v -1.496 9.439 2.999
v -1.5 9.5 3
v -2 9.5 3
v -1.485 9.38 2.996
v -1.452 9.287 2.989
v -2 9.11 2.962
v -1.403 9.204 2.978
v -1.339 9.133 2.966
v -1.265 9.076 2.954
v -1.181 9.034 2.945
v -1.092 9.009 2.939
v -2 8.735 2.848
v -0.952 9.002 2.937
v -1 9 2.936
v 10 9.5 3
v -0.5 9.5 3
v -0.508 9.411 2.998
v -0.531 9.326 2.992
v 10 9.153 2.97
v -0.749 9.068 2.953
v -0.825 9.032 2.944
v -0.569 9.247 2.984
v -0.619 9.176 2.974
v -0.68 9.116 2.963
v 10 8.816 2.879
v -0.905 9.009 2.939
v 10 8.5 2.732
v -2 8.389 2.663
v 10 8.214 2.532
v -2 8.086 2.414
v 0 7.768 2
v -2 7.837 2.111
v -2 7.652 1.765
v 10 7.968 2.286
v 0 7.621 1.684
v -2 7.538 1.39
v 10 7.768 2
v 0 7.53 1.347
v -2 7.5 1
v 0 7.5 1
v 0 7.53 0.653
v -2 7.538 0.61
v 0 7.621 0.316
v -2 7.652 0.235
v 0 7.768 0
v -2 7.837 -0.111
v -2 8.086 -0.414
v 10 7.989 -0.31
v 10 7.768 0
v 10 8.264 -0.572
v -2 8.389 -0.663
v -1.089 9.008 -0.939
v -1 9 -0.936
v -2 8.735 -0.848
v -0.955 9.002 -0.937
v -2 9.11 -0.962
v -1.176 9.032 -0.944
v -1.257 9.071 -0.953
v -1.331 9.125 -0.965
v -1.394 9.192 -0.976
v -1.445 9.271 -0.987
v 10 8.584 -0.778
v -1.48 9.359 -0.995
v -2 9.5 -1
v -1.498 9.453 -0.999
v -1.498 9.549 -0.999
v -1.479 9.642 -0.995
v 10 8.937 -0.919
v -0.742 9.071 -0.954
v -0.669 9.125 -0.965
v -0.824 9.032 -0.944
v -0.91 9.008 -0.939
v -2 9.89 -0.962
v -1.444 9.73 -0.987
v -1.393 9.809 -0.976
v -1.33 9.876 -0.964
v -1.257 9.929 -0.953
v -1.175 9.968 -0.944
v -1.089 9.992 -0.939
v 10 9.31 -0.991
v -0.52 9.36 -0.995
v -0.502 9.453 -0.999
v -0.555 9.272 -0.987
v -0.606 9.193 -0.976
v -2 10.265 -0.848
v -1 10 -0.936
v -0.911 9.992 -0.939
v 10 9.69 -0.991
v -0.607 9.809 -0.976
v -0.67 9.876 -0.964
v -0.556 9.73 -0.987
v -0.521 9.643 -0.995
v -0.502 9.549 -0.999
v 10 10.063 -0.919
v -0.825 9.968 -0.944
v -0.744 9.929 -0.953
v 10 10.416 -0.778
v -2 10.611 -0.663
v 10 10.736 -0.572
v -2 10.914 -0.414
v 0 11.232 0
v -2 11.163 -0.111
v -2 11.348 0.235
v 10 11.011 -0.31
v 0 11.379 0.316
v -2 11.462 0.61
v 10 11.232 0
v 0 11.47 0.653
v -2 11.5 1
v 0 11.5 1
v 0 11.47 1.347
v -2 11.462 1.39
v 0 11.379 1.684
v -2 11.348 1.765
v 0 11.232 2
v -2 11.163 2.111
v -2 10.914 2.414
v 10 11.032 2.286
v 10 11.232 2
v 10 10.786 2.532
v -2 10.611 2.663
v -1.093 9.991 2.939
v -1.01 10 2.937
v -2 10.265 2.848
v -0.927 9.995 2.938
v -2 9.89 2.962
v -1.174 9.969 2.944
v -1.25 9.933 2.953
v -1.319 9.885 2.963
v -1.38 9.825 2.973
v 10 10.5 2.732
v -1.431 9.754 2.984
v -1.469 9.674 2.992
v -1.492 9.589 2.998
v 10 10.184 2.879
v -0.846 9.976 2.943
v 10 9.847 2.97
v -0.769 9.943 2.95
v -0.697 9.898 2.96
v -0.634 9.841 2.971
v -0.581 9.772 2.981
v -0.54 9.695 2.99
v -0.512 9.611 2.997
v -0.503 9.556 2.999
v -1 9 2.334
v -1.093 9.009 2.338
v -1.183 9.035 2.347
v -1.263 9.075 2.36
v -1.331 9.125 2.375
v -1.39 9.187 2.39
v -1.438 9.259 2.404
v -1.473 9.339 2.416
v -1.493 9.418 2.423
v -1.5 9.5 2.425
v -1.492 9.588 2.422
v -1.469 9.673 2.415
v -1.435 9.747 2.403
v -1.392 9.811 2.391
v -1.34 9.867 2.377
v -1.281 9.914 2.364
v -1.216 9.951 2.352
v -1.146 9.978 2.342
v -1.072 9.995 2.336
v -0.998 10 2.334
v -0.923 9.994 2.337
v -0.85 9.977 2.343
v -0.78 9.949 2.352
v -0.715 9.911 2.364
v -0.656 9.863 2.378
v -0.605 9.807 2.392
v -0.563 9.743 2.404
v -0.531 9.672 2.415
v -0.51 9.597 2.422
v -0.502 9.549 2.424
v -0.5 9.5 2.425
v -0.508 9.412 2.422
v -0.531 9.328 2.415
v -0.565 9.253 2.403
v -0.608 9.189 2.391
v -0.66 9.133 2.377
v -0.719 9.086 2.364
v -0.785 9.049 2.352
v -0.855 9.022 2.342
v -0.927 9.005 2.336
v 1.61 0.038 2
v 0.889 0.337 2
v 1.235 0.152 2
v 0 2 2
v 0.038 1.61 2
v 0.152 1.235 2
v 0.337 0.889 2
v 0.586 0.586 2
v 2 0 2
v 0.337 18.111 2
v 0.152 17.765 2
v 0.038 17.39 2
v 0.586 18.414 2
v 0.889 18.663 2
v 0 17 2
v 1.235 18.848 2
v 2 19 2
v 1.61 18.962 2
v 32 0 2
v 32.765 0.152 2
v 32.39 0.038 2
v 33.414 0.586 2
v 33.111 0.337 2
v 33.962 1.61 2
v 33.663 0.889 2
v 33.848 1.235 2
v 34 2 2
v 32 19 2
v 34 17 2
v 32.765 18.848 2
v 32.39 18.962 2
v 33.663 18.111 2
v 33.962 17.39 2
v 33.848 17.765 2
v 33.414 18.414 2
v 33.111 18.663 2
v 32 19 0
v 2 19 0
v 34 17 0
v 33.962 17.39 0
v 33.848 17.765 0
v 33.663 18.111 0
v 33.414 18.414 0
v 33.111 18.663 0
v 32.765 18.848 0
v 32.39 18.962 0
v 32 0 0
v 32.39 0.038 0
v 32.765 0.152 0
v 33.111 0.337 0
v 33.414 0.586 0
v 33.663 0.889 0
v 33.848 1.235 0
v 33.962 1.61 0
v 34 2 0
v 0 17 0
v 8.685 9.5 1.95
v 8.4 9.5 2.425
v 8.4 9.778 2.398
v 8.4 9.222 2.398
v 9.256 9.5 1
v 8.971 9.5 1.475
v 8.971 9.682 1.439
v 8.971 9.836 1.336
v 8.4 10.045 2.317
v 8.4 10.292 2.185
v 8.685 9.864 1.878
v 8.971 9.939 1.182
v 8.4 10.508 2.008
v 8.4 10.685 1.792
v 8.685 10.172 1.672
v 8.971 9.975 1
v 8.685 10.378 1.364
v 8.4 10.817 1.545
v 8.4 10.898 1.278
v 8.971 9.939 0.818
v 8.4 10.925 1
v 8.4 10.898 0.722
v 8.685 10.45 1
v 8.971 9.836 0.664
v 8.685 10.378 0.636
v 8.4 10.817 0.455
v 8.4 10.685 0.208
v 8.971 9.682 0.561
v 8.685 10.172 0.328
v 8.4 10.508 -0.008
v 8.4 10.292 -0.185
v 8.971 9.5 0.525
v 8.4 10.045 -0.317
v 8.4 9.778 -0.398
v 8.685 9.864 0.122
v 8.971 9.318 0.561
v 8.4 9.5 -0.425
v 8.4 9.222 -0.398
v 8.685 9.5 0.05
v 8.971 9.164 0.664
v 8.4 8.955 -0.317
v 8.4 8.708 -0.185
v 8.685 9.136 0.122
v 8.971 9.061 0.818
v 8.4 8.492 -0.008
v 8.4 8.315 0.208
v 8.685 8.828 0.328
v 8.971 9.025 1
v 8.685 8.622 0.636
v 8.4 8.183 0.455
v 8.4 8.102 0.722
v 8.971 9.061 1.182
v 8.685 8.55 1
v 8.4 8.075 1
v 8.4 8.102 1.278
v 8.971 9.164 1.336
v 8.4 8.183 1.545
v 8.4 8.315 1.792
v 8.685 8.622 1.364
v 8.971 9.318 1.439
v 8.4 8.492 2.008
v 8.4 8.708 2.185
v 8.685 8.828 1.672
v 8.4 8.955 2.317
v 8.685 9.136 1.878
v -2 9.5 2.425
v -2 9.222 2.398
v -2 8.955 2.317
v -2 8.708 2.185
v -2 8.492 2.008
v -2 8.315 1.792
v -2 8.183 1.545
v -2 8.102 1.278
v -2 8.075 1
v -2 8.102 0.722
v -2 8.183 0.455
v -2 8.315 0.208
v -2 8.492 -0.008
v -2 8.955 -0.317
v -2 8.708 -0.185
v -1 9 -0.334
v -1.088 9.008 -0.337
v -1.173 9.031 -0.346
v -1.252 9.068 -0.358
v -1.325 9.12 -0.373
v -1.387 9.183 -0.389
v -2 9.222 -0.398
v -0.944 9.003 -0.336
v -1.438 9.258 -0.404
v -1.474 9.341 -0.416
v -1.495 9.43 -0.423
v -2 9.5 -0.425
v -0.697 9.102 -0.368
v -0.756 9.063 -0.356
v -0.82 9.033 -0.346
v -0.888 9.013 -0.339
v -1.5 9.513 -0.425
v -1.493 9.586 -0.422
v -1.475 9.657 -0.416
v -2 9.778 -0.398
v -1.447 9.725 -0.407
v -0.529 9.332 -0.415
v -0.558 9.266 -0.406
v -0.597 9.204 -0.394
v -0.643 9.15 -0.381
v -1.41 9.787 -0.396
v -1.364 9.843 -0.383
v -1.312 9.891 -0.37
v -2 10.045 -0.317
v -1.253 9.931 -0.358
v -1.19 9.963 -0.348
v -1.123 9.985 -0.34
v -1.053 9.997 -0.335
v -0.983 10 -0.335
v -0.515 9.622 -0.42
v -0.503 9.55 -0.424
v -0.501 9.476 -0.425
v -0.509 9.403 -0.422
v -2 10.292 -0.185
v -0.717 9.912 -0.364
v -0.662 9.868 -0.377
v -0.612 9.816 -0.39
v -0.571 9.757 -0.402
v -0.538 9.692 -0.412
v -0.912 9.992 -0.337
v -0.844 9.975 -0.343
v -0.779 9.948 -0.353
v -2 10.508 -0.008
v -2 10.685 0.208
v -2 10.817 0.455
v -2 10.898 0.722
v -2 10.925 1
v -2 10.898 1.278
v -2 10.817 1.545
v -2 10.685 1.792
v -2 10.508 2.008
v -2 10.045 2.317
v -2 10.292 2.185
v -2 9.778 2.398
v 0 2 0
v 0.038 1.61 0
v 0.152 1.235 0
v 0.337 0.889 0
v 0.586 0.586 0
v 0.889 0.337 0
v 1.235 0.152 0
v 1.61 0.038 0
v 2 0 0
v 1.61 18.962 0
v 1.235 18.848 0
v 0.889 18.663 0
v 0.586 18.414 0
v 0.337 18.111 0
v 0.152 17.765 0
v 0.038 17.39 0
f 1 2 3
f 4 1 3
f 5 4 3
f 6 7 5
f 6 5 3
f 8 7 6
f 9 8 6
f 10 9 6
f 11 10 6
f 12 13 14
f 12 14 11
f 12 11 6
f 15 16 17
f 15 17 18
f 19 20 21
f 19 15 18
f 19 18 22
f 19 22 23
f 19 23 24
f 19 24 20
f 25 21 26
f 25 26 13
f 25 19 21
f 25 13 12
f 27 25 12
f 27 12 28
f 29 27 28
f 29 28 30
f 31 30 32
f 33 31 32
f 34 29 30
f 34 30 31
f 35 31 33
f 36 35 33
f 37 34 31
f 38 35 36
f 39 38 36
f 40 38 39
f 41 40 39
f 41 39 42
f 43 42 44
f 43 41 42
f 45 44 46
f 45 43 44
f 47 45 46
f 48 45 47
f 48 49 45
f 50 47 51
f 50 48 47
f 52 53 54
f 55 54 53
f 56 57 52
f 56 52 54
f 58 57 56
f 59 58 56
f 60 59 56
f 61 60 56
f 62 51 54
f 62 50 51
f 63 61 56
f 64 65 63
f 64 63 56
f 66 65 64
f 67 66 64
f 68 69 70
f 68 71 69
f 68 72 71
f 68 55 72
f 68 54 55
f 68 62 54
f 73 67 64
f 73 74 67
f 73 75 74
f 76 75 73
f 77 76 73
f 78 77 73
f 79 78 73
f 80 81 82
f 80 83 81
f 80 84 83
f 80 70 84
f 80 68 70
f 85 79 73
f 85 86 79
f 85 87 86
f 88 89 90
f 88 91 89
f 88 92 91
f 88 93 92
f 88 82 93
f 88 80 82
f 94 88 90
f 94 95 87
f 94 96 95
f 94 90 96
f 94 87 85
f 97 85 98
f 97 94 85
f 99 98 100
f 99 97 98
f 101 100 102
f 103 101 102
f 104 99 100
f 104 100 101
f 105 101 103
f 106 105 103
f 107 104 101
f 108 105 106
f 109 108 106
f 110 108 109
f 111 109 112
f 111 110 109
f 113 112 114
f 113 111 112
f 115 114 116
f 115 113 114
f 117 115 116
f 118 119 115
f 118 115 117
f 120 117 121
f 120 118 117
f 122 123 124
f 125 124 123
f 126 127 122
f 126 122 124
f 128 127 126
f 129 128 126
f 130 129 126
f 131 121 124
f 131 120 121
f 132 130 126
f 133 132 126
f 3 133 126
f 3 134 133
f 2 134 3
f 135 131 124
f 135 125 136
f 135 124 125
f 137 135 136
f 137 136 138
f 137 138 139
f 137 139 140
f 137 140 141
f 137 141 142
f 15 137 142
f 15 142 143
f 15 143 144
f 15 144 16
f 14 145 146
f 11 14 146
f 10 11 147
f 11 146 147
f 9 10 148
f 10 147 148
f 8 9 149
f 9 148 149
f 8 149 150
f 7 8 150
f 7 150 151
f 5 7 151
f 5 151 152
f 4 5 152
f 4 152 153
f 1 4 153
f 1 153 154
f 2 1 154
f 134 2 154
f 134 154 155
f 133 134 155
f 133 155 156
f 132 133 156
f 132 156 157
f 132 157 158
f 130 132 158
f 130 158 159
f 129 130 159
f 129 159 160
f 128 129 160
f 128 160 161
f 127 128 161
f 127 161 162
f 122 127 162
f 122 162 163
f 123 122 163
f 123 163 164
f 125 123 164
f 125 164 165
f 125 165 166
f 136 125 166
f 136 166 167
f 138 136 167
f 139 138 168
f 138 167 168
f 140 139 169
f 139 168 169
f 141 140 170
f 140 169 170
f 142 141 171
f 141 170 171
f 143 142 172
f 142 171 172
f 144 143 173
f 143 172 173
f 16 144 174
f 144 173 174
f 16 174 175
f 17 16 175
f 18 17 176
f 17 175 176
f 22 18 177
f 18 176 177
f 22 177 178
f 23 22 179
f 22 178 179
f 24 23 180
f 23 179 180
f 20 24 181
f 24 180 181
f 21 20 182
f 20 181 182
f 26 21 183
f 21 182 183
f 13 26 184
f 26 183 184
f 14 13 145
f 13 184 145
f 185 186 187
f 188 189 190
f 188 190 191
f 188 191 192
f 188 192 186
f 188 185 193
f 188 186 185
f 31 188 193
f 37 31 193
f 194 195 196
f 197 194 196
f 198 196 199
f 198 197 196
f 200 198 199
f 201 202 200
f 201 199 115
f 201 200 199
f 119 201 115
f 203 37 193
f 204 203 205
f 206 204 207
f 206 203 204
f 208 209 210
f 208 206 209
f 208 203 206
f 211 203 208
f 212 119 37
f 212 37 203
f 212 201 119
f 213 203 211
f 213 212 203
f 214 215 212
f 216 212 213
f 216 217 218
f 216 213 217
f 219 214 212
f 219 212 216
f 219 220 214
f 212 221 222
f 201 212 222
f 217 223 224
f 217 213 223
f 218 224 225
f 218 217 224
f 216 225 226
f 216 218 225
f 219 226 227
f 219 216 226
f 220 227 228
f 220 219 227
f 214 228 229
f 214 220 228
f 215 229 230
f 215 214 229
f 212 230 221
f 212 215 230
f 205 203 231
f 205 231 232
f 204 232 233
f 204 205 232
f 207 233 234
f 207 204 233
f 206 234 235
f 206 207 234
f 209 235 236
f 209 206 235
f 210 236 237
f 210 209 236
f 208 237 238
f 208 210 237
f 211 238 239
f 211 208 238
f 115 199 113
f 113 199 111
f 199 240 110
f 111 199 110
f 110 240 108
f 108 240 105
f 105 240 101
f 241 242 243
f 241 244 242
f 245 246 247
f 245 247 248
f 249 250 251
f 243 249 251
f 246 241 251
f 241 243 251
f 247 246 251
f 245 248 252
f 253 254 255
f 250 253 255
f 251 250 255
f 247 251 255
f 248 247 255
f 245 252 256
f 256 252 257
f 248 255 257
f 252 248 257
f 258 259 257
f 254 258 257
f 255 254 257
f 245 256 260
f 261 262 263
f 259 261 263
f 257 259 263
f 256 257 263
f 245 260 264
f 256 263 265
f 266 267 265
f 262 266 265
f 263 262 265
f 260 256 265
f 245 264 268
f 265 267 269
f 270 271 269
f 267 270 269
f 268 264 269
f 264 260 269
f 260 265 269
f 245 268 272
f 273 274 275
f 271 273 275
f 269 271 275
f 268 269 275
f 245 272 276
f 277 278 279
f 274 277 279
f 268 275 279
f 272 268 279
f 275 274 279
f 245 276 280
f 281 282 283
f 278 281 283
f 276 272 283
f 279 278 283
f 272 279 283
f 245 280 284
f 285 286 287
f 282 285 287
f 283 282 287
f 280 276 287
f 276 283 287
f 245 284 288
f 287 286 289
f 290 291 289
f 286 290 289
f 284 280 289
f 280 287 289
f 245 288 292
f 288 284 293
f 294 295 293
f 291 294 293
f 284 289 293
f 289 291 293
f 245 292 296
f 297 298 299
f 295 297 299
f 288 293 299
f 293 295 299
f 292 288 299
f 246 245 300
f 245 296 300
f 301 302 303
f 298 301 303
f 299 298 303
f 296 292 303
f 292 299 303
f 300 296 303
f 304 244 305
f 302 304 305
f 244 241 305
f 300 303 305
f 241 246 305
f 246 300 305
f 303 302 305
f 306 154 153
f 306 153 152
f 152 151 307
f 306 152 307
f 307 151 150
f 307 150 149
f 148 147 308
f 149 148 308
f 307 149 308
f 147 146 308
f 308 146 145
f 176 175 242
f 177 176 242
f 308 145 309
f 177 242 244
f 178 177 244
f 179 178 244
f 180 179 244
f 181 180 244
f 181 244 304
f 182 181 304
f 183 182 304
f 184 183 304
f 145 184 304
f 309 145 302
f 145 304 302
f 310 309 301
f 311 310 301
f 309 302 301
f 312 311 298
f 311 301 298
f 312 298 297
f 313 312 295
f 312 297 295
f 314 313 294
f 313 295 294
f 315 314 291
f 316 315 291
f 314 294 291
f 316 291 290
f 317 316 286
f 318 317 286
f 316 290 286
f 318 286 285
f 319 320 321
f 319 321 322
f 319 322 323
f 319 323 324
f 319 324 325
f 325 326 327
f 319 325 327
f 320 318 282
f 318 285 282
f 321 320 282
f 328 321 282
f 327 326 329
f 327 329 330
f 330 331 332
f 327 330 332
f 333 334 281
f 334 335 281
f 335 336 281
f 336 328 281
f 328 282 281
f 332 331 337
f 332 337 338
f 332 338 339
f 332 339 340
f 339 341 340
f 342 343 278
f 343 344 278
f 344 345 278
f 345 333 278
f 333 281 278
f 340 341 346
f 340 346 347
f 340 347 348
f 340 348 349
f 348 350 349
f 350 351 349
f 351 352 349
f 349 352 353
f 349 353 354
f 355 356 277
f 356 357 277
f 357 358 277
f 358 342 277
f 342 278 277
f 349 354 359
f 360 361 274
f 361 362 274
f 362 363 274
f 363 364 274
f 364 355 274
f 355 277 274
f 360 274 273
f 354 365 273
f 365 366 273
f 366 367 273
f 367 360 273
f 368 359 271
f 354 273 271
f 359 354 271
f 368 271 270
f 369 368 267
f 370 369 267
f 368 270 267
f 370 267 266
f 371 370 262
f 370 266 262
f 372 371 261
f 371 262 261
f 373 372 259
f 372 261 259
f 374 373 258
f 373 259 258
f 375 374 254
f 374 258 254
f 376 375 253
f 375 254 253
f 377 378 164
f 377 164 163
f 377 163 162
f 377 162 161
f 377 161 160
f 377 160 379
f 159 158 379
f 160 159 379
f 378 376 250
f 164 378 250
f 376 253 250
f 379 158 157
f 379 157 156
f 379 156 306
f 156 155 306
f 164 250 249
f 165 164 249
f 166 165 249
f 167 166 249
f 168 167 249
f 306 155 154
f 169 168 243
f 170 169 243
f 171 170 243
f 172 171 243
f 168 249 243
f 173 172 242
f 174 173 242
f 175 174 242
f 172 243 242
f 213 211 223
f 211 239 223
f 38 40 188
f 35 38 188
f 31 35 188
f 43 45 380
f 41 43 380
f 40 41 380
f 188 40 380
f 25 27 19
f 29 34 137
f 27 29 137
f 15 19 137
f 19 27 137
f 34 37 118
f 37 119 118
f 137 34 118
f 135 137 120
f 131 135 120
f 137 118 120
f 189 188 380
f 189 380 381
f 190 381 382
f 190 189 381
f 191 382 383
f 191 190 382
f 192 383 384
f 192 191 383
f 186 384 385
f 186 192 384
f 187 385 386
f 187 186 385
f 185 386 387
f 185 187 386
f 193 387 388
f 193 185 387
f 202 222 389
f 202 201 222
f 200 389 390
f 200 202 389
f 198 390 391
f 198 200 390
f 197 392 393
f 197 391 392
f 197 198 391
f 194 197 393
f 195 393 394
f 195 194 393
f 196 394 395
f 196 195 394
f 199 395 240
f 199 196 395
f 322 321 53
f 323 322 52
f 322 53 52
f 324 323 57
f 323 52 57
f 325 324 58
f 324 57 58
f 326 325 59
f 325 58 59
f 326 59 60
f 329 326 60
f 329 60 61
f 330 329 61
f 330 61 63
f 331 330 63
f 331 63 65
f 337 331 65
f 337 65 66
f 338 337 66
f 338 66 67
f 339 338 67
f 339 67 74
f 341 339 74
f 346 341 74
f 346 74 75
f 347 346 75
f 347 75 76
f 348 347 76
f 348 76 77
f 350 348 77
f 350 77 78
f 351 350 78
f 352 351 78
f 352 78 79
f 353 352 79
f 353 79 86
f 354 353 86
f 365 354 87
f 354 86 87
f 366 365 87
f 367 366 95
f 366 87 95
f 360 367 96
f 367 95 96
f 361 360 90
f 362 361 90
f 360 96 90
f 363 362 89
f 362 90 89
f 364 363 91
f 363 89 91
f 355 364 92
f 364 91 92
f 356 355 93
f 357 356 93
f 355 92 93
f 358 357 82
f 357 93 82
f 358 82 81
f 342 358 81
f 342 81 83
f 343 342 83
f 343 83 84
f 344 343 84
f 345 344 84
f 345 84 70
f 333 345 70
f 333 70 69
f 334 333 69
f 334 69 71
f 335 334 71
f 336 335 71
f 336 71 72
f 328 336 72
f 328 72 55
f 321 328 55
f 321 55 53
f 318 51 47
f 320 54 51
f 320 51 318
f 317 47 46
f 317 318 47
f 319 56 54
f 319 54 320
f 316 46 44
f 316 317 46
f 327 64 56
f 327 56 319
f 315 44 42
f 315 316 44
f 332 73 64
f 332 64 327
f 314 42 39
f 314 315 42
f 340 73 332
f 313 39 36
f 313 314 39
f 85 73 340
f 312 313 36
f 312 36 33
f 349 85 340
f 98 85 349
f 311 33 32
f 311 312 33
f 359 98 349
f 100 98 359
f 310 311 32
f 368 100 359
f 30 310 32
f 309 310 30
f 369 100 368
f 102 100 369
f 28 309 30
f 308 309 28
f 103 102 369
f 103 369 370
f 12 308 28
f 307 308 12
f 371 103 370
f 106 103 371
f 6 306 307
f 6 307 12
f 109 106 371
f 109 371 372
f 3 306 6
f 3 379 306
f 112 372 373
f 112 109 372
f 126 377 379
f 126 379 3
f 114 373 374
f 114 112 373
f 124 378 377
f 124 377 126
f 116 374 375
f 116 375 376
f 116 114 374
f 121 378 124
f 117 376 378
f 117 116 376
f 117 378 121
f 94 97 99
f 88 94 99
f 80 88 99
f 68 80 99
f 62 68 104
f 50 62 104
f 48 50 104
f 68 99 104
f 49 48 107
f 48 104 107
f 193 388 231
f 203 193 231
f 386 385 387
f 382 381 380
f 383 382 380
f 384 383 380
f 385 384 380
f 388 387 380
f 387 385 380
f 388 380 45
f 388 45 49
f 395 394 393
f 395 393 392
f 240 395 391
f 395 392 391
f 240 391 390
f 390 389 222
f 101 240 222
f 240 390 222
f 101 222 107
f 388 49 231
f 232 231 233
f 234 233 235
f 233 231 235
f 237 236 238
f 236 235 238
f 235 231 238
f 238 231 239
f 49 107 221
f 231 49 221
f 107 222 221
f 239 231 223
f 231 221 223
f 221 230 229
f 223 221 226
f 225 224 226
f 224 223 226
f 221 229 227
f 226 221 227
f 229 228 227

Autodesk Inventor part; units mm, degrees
ref_plane "YZ Plane" through (0, 0, 0) normal (1, 0, 0) x (0, 1, 0)
sketch "Sketch1" plane through (0, 0, 0) normal (0, 0, 1) x (1, 0, 0)
  line L0 (0, 0) -> (34, 0)
  line L1 (34, 0) -> (34, 19)
  line L2 (34, 19) -> (0, 19)
  line L3 (0, 19) -> (0, 0)
  dimension "d0" = 34
extrude "Extrusion1" add sketch "Sketch1" along normal blind 2
fillet "Fillet1" radius 2 4 edges at (34, 19, 1) (34, 0, 1) (0, 19, 1) (0, 0, 1)
sketch "Sketch3" plane through (0, 2, 0) normal (-1, 0, 0) x (0, 0, 1)
  line L0 (2, 0) -> (0, 0) construction
  line L1 (2, 15) -> (2, 0) construction
  line L2 (0, 0) -> (2, 15) construction
  line L3 (0, 15) -> (2, 0) construction
  circle A0 centre (1, 7.5) radius 2
  point P0 (0, -2)
  dimension "d4" = 4
extrude "Extrusion2" add sketch "Sketch3" along normal blind 2 and the other way blind 10
sketch "Sketch4" plane through (-2, 9.5, 1) normal (-1, 0, 0) x (0, 0, 1)
  point P0 (-1, -9.5)
  point P1 (0, 0)
hole "Hole1" at (-2, 9.5, 1) direction (1, 0, 0) diameter 2.85 depth 10.4 tip angle 118 thread size "M3.5x0.6" class "6H" standard "ANSI Metric M Profile"
ref_plane "Work Plane2" through (0, 0, 3) normal (0, 0, 1) x (1, 0, 0)
ref_plane "Work Plane1" through (0, 0, 1) normal (0, 0, 1) x (1, 0, 0)
sketch "Sketch6" plane through (0, 0, 3) normal (0, 0, 1) x (1, 0, 0)
  line L0 (-2, 11.5) -> (-2, 7.5) construction
  line L1 (0, 7.5) -> (0, 7.7679) construction
  line L2 (-2, 11.5) -> (0, 7.5) construction
  line L3 (0, 7.5) -> (-2, 7.5) construction
  line L4 (-2, 7.5) -> (0, 11.5) construction
  line L5 (0, 11.5) -> (-2, 11.5) construction
  point P0 (0, 0)
  point P1 (-1, 9.5)
hole "Hole2" at (-1, 9.5, 3) direction (0, 0, -1) diameter 1 end through all
ref_plane "Work Plane3" through (0, 0, 3) normal (0, 0, 1) x (1, 0, 0)
properties part number "UntererRührerBlatt"
